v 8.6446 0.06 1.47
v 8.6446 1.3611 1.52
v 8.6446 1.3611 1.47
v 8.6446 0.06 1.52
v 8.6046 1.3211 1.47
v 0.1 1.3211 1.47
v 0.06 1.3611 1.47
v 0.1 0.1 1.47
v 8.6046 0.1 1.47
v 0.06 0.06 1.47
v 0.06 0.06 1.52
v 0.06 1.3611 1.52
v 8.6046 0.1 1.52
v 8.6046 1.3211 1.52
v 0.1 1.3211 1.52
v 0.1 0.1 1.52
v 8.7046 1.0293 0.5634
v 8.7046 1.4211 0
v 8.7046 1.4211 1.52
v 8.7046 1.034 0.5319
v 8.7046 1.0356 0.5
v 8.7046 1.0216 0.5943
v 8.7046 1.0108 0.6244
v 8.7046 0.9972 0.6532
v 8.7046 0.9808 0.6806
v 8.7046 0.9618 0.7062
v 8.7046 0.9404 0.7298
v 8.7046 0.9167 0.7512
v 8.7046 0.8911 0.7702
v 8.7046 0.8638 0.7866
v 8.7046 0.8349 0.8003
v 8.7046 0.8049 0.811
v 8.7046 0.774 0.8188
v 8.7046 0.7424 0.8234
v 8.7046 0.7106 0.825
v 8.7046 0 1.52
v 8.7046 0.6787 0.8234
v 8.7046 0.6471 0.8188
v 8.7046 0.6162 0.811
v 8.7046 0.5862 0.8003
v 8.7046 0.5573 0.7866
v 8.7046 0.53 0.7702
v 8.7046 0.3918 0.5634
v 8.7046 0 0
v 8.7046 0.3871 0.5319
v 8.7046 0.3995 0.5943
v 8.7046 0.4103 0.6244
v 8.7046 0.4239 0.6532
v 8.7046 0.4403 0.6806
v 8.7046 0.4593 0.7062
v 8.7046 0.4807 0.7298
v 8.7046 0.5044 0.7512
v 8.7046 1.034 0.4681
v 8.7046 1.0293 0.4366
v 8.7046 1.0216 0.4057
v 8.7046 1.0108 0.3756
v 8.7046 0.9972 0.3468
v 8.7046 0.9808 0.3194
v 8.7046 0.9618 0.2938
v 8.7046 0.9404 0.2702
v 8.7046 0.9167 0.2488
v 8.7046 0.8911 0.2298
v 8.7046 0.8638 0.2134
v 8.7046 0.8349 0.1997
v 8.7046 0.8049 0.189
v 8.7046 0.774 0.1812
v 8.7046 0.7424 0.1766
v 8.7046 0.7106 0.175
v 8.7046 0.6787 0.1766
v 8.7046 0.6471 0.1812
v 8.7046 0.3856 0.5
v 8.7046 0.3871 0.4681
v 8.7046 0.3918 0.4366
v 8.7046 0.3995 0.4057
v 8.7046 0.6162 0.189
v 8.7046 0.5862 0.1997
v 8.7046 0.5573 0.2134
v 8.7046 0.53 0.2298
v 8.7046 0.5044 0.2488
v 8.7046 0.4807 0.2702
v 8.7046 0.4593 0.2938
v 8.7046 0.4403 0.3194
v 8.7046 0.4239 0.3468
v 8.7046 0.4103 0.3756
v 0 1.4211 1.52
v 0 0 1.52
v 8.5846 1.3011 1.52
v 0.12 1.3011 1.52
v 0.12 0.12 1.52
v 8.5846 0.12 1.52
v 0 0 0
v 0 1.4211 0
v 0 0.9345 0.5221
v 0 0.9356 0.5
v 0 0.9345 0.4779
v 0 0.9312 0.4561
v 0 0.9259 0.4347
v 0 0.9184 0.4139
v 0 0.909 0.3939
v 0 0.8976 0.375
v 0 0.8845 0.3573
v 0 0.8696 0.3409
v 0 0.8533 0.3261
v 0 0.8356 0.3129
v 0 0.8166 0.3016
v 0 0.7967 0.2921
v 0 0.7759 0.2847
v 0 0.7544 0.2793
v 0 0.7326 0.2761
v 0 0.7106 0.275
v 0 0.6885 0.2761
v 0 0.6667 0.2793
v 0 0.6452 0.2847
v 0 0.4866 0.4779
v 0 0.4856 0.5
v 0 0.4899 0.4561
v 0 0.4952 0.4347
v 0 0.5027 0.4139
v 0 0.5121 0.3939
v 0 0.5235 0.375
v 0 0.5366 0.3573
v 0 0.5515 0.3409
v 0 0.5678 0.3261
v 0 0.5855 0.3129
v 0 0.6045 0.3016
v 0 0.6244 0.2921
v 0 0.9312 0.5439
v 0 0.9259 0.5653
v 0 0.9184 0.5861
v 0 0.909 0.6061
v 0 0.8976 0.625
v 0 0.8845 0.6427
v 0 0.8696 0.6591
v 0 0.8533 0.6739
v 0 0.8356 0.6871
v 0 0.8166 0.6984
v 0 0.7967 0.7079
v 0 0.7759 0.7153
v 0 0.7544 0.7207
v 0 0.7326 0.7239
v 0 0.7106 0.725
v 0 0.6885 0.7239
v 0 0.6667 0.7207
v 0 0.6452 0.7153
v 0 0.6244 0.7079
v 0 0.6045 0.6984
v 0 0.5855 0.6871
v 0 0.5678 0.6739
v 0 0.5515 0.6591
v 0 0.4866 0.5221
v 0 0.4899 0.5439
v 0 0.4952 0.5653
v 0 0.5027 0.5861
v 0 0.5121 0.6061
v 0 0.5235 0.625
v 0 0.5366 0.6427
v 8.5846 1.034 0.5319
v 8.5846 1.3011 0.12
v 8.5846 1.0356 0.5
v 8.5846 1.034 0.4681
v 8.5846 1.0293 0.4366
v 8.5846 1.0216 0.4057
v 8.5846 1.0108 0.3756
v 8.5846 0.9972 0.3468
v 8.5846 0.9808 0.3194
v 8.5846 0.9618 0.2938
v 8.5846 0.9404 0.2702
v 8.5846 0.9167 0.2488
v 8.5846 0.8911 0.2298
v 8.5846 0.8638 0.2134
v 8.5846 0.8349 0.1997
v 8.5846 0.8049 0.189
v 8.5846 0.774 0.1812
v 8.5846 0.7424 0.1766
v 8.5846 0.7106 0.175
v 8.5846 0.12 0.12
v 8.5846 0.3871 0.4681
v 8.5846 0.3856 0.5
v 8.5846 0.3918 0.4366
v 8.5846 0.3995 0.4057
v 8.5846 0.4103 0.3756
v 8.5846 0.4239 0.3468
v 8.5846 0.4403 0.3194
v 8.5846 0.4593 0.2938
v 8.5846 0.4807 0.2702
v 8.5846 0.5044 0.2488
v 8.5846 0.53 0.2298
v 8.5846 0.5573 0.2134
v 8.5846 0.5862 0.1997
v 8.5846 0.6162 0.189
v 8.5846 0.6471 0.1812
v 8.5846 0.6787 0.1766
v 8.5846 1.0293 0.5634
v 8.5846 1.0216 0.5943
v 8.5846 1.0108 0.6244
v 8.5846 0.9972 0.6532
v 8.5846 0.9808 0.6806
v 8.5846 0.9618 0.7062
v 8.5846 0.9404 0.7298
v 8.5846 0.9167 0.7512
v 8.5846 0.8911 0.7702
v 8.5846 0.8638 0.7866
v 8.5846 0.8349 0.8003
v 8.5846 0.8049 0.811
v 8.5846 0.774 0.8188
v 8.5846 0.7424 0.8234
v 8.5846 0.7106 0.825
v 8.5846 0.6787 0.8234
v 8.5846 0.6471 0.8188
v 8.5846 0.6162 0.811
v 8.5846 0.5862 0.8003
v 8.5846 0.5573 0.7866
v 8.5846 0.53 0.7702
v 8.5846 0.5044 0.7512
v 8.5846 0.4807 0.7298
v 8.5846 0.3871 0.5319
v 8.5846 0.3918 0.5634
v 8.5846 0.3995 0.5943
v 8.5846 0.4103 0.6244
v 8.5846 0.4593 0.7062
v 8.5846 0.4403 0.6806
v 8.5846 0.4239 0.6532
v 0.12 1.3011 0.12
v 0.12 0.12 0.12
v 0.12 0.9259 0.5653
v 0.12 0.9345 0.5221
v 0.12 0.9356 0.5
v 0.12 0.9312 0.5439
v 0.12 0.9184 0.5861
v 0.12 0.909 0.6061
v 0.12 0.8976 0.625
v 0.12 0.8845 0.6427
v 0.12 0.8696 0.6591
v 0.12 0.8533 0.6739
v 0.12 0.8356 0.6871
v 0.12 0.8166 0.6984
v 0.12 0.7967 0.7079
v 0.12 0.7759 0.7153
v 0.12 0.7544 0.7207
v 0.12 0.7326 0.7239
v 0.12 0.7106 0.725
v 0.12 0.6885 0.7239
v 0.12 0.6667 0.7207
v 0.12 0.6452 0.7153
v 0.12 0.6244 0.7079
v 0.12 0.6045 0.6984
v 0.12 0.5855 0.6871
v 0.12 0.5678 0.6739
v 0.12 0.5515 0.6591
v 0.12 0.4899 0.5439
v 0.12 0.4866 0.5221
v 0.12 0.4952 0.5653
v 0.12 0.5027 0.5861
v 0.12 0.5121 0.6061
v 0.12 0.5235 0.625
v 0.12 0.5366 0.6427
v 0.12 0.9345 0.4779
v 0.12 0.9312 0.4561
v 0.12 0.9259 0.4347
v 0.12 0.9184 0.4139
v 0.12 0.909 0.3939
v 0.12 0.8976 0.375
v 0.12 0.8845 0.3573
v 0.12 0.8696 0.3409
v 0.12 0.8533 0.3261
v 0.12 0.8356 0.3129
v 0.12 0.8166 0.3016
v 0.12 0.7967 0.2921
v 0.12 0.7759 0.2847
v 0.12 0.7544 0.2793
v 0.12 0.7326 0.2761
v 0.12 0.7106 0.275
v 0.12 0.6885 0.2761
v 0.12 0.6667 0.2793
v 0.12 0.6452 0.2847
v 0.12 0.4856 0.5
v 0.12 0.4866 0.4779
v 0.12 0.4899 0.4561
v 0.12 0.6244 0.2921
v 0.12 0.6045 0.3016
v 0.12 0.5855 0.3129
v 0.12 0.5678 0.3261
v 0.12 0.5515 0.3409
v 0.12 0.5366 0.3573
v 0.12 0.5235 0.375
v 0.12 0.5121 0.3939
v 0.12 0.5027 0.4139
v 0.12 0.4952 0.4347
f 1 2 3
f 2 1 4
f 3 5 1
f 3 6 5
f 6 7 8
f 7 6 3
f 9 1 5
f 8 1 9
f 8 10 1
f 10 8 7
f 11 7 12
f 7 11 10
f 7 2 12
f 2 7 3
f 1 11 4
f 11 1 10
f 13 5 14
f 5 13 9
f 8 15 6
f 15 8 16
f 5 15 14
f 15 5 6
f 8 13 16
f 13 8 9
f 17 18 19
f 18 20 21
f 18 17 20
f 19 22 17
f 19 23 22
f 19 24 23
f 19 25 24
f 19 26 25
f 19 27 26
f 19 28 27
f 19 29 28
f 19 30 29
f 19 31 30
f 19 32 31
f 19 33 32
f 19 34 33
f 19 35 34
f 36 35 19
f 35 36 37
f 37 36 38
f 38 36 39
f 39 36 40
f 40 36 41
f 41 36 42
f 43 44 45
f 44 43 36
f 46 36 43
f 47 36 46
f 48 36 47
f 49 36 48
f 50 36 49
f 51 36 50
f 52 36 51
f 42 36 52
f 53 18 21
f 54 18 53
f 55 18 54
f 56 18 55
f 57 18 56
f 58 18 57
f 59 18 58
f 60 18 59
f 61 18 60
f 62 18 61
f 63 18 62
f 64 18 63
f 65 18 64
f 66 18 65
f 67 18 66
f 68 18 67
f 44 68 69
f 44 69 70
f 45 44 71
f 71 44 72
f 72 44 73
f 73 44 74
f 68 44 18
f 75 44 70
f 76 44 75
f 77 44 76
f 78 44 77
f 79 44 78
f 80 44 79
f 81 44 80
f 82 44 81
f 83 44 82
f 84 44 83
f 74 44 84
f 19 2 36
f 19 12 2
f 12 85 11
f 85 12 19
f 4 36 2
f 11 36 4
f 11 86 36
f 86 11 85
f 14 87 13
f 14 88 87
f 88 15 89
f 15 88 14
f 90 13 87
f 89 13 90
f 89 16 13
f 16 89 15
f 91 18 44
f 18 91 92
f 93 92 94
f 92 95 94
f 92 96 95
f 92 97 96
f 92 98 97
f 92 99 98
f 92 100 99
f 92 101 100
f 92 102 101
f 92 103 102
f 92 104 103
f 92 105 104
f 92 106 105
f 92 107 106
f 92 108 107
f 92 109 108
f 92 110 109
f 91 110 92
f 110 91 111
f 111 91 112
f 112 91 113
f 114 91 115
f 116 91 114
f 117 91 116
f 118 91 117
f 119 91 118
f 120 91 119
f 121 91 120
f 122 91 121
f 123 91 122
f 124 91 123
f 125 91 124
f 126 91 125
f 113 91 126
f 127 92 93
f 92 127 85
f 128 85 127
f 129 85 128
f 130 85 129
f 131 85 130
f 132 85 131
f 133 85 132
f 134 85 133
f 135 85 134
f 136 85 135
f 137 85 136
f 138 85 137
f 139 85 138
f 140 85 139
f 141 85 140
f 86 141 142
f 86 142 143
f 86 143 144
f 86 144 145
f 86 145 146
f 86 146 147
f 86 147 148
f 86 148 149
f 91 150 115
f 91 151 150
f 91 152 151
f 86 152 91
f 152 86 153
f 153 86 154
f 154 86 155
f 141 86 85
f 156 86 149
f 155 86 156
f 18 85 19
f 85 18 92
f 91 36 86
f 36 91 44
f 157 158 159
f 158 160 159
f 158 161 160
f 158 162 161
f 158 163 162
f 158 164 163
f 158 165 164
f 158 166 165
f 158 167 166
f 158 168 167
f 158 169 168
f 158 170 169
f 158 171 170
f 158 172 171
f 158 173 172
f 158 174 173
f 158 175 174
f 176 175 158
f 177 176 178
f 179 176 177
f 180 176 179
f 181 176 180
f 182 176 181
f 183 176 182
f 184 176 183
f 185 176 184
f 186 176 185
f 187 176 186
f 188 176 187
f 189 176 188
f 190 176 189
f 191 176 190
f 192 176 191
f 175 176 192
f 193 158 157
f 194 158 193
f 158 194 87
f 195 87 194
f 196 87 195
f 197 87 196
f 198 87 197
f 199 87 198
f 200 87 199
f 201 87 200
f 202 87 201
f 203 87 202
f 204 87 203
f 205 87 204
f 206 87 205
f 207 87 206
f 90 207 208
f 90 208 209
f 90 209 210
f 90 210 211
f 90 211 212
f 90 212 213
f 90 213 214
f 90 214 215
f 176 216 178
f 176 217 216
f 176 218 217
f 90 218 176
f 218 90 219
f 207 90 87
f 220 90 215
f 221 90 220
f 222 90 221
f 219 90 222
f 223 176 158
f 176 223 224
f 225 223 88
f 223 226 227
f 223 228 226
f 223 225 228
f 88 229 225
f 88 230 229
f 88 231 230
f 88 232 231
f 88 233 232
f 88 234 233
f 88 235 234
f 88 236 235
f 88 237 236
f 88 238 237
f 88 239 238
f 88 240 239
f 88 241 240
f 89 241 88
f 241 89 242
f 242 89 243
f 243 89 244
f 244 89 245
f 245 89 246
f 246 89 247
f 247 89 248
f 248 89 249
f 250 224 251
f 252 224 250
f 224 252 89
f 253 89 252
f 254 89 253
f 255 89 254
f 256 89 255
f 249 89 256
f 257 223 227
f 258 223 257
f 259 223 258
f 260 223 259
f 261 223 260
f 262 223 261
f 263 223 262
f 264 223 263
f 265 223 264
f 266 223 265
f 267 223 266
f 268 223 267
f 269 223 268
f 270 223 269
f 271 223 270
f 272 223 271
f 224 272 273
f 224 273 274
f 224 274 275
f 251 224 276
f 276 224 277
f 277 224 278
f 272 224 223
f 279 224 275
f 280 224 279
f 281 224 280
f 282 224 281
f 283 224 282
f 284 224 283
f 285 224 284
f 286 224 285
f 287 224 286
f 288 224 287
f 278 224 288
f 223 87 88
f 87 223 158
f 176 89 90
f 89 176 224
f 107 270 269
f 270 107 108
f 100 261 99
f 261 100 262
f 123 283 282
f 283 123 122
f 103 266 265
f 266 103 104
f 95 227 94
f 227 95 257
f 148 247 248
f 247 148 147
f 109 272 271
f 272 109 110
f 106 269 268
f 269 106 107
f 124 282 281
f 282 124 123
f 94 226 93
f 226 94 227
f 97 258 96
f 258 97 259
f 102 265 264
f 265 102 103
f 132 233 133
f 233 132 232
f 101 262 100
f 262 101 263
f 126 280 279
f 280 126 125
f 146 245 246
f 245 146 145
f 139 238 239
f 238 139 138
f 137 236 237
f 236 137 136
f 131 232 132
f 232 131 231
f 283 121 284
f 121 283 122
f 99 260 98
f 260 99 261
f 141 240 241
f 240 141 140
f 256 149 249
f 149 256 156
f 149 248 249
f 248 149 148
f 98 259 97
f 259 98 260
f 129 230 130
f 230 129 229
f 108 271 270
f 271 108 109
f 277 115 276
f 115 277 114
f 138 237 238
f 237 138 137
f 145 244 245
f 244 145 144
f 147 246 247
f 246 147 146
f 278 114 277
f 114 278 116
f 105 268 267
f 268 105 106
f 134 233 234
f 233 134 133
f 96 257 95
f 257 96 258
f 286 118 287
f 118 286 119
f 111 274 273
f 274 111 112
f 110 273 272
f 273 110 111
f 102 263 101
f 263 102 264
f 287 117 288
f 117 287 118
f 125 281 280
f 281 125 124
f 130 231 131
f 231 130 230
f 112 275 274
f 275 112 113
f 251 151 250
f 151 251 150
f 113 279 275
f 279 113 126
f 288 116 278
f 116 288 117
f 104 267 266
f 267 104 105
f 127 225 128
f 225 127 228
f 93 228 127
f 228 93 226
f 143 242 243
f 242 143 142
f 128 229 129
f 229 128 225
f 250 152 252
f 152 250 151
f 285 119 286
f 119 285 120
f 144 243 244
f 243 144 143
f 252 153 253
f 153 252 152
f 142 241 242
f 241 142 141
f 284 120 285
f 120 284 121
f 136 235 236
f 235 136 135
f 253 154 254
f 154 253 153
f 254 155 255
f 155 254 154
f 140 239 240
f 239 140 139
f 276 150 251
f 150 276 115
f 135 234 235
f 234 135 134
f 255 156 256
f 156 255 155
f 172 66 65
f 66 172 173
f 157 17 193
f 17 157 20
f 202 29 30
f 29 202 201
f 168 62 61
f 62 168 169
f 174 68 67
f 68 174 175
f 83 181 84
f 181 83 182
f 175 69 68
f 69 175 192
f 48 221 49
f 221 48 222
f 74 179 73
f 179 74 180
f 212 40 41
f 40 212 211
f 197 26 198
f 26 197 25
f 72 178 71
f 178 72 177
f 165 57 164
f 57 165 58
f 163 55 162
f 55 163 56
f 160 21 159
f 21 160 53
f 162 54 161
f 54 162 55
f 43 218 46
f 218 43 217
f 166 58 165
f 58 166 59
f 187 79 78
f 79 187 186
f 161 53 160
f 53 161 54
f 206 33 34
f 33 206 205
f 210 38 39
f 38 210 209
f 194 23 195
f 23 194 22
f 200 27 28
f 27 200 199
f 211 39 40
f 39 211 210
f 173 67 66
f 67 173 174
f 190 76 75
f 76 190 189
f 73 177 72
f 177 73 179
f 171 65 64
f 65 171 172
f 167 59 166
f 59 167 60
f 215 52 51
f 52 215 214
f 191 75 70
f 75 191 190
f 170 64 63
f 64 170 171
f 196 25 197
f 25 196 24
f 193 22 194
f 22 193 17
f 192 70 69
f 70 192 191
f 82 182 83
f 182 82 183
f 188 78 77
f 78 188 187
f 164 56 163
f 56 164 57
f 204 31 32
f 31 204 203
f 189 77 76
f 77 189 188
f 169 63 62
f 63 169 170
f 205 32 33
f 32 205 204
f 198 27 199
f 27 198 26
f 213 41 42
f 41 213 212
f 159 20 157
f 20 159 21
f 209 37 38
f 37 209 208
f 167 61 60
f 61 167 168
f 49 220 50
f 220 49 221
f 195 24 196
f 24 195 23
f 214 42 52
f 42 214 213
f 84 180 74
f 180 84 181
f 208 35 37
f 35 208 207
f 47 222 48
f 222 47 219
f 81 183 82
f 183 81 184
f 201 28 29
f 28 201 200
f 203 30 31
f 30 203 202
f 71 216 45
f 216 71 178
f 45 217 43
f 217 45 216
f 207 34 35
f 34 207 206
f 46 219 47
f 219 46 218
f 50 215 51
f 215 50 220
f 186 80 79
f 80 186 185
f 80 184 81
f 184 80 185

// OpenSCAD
// Industrial 12-Node Hub - Indoor IP65 Sealed Server Junction Enclosure
$fn = 64;

// Physical dimensions adjusted for industrial gasket tracking
pcb_length     = 215.0 * 0.0393701; // Inches (~8.46")
pcb_width      = 30.0  * 0.0393701;  // Inches (~1.18")
internal_depth = 1.40;               // Additional cavity clearance for potted wiring
wall_thick     = 0.12;               // 3mm ruggedized flame-retardant walls

module ip65_server_junction_box() {
    difference() {
        // 1. Master Exterior Enclosure Tub (Molded in Standard Fire Red polymer)
        cube([pcb_length + (wall_thick * 2), pcb_width + (wall_thick * 2), internal_depth + wall_thick]);
        
        // 2. Sealed Internal Electronic Sanctuary Cavity
        translate([wall_thick, wall_thick, wall_thick])
            cube([pcb_length, pcb_width, internal_depth + 0.1]);
            
        // 3. Continuous Continuous O-Ring Gasket Track Along Rim Wall
        // Compresses flat to create an unbreachable indoor moisture boundary
        translate([wall_thick / 2, wall_thick / 2, internal_depth + wall_thick - 0.05])
            difference() {
                cube([pcb_length + wall_thick, pcb_width + wall_thick, 0.06]);
                translate([0.04, 0.04, -0.01])
                    cube([pcb_length + wall_thick - 0.08, pcb_width + wall_thick - 0.08, 0.08]);
            }
            
        // 4. Threaded IP67 Waterproof 2.1mm DC Power Feed Hole
        translate([-0.05, (pcb_width / 2) + wall_thick, 0.5])
            rotate([0, 90, 0])
                cylinder(h = wall_thick + 0.1, d = 0.45); // Sized for waterproof barrel bulkhead connectors
                
        // 5. Threaded IP67 Waterproof Host Data Link USB-B Hole
        translate([pcb_length + wall_thick - 0.05, (pcb_width / 2) + wall_thick, 0.5])
            rotate([0, 90, 0])
                cylinder(h = wall_thick + 0.1, d = 0.65); // Standard 16.5mm sealed bulkhead collar
    }
}

ip65_server_junction_box();
